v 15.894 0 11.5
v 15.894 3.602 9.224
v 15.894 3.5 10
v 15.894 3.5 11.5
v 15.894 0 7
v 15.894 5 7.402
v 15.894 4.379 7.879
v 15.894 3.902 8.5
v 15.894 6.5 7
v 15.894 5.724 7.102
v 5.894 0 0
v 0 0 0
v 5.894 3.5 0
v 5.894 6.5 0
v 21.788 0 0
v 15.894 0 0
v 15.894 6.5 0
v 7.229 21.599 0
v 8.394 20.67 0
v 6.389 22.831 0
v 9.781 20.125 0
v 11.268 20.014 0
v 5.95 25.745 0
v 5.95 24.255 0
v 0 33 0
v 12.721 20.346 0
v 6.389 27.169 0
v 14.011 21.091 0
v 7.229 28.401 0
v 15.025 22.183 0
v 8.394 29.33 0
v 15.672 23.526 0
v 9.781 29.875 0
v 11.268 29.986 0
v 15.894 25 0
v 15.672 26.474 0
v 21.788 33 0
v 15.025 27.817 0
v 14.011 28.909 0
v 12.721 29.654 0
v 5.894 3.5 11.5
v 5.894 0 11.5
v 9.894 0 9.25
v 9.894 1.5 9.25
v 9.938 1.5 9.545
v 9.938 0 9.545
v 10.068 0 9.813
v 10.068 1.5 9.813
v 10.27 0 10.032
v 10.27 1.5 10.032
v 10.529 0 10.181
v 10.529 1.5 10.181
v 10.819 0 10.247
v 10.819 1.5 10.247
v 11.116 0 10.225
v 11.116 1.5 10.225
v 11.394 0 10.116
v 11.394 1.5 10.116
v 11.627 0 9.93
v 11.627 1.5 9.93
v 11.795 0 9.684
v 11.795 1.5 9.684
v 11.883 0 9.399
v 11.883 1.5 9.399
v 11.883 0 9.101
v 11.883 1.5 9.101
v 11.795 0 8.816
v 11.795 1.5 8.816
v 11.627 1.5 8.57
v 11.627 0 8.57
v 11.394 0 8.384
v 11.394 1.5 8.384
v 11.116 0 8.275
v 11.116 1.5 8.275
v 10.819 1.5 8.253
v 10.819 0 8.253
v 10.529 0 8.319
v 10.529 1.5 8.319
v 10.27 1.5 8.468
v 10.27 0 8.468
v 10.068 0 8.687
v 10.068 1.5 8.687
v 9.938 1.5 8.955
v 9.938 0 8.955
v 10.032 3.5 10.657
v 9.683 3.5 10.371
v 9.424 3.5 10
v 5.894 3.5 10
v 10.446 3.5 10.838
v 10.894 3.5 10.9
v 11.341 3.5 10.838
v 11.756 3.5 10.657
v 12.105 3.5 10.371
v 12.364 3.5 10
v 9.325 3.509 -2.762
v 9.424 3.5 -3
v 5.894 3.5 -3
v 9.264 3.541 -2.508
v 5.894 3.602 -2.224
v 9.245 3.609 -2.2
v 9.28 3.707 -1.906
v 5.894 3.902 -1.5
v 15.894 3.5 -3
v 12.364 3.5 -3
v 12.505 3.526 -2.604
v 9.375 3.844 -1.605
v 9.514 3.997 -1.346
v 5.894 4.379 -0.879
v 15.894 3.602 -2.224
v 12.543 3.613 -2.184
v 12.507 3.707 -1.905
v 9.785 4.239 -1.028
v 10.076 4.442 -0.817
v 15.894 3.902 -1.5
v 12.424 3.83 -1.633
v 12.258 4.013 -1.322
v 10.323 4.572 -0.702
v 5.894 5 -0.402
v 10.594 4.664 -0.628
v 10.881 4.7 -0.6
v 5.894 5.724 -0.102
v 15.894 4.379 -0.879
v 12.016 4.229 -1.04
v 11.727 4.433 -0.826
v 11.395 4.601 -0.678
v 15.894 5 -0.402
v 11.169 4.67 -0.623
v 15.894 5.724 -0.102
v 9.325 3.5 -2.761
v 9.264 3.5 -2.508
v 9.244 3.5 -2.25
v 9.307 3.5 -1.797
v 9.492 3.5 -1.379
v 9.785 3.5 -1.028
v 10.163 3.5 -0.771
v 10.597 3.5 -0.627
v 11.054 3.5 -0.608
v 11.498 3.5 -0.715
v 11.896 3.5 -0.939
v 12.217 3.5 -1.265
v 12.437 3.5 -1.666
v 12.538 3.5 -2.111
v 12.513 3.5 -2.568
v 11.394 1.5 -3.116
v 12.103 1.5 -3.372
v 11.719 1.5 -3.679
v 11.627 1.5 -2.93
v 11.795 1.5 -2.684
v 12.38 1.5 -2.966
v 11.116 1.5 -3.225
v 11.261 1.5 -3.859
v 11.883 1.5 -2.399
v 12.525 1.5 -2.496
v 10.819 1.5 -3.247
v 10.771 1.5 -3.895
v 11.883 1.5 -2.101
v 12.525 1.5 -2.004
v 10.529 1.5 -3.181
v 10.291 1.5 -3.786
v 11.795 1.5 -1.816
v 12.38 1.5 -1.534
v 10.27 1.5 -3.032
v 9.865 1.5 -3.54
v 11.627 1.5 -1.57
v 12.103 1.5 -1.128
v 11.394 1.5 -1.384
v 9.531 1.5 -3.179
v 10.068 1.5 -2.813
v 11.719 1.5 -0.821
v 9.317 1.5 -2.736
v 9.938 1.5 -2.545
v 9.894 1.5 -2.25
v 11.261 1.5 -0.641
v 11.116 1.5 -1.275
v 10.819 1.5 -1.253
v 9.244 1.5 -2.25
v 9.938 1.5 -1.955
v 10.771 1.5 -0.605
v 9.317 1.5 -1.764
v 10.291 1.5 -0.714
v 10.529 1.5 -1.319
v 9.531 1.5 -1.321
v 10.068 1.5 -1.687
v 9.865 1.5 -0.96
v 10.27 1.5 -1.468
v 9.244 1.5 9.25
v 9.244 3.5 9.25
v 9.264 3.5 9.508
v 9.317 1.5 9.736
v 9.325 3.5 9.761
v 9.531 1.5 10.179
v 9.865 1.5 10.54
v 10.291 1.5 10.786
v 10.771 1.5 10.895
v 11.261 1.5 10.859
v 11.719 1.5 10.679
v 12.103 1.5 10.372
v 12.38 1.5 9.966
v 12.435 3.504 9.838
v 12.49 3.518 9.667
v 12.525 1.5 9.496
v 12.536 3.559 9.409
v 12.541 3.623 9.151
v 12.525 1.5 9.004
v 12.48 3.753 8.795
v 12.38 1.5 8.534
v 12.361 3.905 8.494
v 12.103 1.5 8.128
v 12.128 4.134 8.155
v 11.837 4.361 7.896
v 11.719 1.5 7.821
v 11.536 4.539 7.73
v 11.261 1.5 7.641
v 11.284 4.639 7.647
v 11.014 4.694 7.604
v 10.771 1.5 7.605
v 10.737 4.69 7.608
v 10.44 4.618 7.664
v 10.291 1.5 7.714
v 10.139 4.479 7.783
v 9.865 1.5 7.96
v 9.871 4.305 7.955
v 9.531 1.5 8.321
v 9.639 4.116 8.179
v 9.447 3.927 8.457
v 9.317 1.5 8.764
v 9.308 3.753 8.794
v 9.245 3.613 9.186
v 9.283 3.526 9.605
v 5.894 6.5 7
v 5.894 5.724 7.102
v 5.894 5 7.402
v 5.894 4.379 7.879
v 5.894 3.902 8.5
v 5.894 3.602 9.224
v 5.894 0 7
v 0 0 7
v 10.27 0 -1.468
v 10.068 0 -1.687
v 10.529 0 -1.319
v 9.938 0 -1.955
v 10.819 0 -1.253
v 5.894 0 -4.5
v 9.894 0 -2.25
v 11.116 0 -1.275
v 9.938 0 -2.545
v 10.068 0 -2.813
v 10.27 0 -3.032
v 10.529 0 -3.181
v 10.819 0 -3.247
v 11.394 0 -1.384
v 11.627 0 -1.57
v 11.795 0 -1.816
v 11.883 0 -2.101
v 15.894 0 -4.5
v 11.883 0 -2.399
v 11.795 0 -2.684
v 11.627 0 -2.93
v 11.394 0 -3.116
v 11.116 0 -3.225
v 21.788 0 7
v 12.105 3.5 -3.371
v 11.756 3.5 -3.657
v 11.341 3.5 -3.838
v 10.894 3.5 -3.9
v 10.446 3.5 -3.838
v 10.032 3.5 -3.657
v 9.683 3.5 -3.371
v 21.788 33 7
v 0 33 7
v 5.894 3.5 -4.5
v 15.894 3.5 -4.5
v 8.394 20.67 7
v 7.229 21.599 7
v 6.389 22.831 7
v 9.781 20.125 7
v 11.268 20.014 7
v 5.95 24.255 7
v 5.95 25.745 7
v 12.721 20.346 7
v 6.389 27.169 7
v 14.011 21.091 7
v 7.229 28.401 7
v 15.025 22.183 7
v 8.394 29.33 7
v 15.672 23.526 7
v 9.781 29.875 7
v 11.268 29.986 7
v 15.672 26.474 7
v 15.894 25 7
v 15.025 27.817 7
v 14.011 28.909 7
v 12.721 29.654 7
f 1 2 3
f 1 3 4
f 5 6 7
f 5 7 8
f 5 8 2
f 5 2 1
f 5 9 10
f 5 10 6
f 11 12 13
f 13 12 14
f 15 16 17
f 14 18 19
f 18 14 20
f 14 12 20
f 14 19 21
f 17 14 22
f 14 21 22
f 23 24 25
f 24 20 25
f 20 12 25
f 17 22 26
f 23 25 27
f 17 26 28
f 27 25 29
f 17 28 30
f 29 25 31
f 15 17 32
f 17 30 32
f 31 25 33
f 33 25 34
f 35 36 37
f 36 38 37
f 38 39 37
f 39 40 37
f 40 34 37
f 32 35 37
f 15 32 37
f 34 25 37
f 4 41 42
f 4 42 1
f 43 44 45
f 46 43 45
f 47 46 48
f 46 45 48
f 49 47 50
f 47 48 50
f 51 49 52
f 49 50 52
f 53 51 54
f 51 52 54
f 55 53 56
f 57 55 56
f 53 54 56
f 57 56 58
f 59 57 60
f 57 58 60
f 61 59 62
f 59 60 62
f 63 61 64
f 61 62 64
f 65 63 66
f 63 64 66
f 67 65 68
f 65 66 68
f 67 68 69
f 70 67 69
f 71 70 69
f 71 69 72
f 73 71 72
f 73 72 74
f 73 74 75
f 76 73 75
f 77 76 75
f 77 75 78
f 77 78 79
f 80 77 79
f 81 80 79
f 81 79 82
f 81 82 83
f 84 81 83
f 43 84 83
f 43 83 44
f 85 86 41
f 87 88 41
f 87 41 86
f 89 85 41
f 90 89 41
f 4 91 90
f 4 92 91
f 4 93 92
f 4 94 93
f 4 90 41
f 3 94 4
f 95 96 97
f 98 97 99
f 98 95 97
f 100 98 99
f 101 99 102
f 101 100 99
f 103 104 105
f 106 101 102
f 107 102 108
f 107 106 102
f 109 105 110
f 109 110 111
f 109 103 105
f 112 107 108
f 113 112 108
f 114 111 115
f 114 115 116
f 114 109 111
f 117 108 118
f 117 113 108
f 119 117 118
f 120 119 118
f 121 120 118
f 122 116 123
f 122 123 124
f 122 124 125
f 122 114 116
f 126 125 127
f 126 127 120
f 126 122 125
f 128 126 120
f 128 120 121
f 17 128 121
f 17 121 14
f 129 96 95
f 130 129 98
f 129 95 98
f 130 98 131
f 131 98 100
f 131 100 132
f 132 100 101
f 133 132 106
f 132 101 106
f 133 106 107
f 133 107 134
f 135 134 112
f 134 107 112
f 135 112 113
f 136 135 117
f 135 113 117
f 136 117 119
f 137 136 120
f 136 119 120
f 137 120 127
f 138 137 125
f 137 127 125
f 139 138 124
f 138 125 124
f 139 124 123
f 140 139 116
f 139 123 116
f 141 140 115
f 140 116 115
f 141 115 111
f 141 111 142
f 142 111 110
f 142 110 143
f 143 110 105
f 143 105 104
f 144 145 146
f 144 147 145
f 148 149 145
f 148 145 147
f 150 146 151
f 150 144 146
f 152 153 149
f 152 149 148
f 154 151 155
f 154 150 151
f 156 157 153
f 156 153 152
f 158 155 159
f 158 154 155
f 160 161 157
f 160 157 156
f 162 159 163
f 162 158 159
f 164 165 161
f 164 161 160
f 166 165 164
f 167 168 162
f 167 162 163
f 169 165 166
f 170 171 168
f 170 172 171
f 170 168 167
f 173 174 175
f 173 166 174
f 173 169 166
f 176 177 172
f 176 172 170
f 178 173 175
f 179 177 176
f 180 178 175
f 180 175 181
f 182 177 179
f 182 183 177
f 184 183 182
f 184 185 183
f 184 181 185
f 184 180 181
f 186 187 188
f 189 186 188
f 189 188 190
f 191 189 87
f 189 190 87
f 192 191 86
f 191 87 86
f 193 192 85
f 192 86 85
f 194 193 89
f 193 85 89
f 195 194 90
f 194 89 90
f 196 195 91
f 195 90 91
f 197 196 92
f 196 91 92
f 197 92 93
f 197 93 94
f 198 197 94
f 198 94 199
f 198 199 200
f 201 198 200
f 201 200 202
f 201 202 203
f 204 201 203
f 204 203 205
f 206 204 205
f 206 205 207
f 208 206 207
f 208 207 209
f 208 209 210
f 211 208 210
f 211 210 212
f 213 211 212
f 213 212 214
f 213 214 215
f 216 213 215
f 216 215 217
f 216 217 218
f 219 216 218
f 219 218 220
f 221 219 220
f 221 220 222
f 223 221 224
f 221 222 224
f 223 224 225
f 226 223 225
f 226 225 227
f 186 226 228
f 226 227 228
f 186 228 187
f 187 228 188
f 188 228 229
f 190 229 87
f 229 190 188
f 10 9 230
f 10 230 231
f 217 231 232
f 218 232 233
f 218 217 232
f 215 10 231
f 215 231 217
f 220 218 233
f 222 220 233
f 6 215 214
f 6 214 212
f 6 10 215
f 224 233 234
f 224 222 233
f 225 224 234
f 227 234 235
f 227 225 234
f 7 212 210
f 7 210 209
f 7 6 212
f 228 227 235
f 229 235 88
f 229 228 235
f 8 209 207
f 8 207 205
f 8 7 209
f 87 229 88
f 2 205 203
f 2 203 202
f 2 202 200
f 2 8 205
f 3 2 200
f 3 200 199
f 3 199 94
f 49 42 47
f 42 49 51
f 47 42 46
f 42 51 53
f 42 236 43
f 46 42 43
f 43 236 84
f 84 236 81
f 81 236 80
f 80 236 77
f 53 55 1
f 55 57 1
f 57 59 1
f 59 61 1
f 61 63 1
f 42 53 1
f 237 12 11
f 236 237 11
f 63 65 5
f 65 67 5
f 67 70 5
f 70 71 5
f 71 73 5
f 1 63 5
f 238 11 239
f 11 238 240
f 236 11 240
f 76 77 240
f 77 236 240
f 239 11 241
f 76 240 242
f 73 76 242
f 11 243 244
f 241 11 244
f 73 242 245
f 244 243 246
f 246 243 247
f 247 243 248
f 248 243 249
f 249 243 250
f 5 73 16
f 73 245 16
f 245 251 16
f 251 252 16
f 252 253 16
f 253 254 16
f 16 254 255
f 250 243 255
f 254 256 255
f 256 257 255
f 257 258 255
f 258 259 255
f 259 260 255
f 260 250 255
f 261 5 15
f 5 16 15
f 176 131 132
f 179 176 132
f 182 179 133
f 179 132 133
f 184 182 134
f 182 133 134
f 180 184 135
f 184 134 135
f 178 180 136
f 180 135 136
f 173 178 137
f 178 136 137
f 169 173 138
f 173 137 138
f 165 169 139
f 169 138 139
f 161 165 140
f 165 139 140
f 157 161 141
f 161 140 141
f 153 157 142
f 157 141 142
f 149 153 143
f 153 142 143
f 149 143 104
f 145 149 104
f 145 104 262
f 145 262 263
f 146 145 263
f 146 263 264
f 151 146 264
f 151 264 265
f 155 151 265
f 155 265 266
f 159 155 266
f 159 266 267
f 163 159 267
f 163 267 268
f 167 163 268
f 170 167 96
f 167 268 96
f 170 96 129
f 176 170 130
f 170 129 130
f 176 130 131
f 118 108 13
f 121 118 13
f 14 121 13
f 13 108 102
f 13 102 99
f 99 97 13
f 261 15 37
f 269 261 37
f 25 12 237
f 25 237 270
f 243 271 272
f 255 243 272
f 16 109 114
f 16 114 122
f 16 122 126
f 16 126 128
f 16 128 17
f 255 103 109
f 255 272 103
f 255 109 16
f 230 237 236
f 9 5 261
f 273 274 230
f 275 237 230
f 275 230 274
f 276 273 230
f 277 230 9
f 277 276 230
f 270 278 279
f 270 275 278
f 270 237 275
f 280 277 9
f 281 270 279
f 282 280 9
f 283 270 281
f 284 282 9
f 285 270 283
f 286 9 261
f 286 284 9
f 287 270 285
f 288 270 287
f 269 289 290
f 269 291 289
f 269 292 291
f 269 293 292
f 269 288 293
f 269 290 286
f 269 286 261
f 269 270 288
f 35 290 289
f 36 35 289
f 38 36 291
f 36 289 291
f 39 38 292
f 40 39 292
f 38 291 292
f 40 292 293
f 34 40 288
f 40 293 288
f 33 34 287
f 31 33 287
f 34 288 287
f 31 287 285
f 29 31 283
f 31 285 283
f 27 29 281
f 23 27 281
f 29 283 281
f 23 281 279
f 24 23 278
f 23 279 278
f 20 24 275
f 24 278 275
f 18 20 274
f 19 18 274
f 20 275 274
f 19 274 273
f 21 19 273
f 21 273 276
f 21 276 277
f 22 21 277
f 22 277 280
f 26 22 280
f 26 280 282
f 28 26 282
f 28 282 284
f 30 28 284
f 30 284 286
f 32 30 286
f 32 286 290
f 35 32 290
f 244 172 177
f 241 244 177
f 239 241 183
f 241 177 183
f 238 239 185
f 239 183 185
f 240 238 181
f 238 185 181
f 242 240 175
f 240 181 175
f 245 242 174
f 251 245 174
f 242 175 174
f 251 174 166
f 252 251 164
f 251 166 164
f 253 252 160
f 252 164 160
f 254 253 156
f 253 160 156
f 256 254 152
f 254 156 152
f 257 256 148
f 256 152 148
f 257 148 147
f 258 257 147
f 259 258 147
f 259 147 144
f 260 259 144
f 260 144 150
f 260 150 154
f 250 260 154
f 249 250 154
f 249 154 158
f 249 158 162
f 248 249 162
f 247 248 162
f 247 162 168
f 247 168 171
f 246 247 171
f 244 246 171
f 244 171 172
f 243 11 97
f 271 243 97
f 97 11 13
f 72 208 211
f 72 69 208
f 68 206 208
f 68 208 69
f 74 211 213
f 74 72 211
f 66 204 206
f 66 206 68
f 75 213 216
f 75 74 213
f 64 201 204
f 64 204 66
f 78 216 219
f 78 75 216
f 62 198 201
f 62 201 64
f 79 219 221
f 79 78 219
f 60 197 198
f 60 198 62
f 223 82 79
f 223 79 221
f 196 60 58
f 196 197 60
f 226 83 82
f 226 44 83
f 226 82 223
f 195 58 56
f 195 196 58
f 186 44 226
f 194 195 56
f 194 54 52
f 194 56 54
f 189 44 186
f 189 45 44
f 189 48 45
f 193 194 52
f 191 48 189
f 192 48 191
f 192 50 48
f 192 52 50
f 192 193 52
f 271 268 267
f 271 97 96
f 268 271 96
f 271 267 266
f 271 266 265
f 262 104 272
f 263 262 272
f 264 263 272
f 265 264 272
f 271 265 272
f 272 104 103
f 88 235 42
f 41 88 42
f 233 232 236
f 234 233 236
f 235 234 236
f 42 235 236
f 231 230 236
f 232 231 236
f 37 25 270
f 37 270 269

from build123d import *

# Parameters (mm, degrees)
SKETCH1_W           = 21.78773772
SKETCH1_H           = 33
BOSS_EXTRUDE1_DEPTH = 7
SKETCH2_R           = 5
CUT_EXTRUDE1_DEPTH  = 41.158504889
SKETCH3_W           = 10
SKETCH3_H           = 3.5
BOSS_EXTRUDE2_DEPTH = 4.5
SKETCH4_R           = 1
CUT_EXTRUDE2_DEPTH  = 39.434431373
SKETCH5_R           = 1.65
CUT_EXTRUDE3_DEPTH  = 2
FILLET1_R           = 3


with BuildPart() as part:
    # Sketch1 → Boss-Extrude1 (new body)
    with BuildSketch(Plane.XY):
        with Locations((10.89386886, 16.5)):
            Rectangle(SKETCH1_W, SKETCH1_H)
    extrude(amount=BOSS_EXTRUDE1_DEPTH)

    # Sketch2 → Cut-Extrude1 (cut, through all)
    with BuildSketch(Plane.XY.offset(7)):
        with Locations((10.89386886, 25)):
            Circle(SKETCH2_R)
    extrude(amount=-CUT_EXTRUDE1_DEPTH, mode=Mode.SUBTRACT)

    # Sketch3 → Boss-Extrude2 (add)
    with BuildSketch(Plane.XY.offset(7)):
        with Locations((10.89386886, 1.75)):
            Rectangle(SKETCH3_W, SKETCH3_H)
    boss_extrude2 = extrude(amount=BOSS_EXTRUDE2_DEPTH)

    # Mirror1: Boss-Extrude2 across plane
    add(boss_extrude2.mirror(Plane.XY.offset(3.5)))

    # Sketch4 → Cut-Extrude2 (cut, through all)
    with BuildSketch(Plane(origin=(0, 3.5, 0), x_dir=(1, 0, 0), z_dir=(0, 1, 0))):
        with Locations(Location((10.89386886, 2.25, 0), (0, 0, 180))):
            Circle(SKETCH4_R)
        with Locations(Location((10.89386886, -9.25, 0), (0, 0, 180))):
            Circle(SKETCH4_R)
    extrude(amount=-CUT_EXTRUDE2_DEPTH, mode=Mode.SUBTRACT)

    # Sketch5 → Cut-Extrude3 (cut)
    with BuildSketch(Plane(origin=(0, 3.5, 0), x_dir=(1, 0, 0), z_dir=(0, 1, 0))):
        with Locations(Location((10.89386886, 2.25, 0), (0, 0, 180))):
            Circle(SKETCH5_R)
        with Locations(Location((10.89386886, -9.25, 0), (0, 0, 180))):
            Circle(SKETCH5_R)
    extrude(amount=-CUT_EXTRUDE3_DEPTH, mode=Mode.SUBTRACT)

    # Fillet1
    # the kernel refuses this fillet: 3 mm, written as the material it adds along each edge
    with BuildSketch(Plane(origin=(15.89386886, 3.5, 7), x_dir=(0, 1, 0), z_dir=(-1, 0, 0))) as fillet1_piece_1_section:
        with BuildLine():
            CenterArc((FILLET1_R, -FILLET1_R), FILLET1_R, 90, 90)
            Line((0, -FILLET1_R), (0, 0))
            Line((0, 0), (FILLET1_R, 0))
        make_face()
    fillet1_piece_1 = extrude(amount=10, mode=Mode.PRIVATE)
    fillet1_piece_1 = fillet1_piece_1 - Plane(origin=(10.89386886, 4.228948509, 9.25), x_dir=(-1, 0, 0), z_dir=(0, 1, 0)) * Cylinder(1.65, 32, mode=Mode.PRIVATE)
    add(fillet1_piece_1)
    with BuildSketch(Plane(origin=(15.89386886, 3.5, 0), x_dir=(0, 1, 0), z_dir=(-1, 0, 0))) as fillet1_piece_2_section:
        with BuildLine():
            CenterArc((FILLET1_R, FILLET1_R), FILLET1_R, 180, 90)
            Line((0, FILLET1_R), (0, 0))
            Line((0, 0), (FILLET1_R, 0))
        make_face()
    fillet1_piece_2 = extrude(amount=10, mode=Mode.PRIVATE)
    fillet1_piece_2 = fillet1_piece_2 - Plane(origin=(10.89386886, 4.228948802, -2.25), x_dir=(-1, 0, 0), z_dir=(0, 1, 0)) * Cylinder(1.65, 32, mode=Mode.PRIVATE)
    add(fillet1_piece_2)


solid = part.part
